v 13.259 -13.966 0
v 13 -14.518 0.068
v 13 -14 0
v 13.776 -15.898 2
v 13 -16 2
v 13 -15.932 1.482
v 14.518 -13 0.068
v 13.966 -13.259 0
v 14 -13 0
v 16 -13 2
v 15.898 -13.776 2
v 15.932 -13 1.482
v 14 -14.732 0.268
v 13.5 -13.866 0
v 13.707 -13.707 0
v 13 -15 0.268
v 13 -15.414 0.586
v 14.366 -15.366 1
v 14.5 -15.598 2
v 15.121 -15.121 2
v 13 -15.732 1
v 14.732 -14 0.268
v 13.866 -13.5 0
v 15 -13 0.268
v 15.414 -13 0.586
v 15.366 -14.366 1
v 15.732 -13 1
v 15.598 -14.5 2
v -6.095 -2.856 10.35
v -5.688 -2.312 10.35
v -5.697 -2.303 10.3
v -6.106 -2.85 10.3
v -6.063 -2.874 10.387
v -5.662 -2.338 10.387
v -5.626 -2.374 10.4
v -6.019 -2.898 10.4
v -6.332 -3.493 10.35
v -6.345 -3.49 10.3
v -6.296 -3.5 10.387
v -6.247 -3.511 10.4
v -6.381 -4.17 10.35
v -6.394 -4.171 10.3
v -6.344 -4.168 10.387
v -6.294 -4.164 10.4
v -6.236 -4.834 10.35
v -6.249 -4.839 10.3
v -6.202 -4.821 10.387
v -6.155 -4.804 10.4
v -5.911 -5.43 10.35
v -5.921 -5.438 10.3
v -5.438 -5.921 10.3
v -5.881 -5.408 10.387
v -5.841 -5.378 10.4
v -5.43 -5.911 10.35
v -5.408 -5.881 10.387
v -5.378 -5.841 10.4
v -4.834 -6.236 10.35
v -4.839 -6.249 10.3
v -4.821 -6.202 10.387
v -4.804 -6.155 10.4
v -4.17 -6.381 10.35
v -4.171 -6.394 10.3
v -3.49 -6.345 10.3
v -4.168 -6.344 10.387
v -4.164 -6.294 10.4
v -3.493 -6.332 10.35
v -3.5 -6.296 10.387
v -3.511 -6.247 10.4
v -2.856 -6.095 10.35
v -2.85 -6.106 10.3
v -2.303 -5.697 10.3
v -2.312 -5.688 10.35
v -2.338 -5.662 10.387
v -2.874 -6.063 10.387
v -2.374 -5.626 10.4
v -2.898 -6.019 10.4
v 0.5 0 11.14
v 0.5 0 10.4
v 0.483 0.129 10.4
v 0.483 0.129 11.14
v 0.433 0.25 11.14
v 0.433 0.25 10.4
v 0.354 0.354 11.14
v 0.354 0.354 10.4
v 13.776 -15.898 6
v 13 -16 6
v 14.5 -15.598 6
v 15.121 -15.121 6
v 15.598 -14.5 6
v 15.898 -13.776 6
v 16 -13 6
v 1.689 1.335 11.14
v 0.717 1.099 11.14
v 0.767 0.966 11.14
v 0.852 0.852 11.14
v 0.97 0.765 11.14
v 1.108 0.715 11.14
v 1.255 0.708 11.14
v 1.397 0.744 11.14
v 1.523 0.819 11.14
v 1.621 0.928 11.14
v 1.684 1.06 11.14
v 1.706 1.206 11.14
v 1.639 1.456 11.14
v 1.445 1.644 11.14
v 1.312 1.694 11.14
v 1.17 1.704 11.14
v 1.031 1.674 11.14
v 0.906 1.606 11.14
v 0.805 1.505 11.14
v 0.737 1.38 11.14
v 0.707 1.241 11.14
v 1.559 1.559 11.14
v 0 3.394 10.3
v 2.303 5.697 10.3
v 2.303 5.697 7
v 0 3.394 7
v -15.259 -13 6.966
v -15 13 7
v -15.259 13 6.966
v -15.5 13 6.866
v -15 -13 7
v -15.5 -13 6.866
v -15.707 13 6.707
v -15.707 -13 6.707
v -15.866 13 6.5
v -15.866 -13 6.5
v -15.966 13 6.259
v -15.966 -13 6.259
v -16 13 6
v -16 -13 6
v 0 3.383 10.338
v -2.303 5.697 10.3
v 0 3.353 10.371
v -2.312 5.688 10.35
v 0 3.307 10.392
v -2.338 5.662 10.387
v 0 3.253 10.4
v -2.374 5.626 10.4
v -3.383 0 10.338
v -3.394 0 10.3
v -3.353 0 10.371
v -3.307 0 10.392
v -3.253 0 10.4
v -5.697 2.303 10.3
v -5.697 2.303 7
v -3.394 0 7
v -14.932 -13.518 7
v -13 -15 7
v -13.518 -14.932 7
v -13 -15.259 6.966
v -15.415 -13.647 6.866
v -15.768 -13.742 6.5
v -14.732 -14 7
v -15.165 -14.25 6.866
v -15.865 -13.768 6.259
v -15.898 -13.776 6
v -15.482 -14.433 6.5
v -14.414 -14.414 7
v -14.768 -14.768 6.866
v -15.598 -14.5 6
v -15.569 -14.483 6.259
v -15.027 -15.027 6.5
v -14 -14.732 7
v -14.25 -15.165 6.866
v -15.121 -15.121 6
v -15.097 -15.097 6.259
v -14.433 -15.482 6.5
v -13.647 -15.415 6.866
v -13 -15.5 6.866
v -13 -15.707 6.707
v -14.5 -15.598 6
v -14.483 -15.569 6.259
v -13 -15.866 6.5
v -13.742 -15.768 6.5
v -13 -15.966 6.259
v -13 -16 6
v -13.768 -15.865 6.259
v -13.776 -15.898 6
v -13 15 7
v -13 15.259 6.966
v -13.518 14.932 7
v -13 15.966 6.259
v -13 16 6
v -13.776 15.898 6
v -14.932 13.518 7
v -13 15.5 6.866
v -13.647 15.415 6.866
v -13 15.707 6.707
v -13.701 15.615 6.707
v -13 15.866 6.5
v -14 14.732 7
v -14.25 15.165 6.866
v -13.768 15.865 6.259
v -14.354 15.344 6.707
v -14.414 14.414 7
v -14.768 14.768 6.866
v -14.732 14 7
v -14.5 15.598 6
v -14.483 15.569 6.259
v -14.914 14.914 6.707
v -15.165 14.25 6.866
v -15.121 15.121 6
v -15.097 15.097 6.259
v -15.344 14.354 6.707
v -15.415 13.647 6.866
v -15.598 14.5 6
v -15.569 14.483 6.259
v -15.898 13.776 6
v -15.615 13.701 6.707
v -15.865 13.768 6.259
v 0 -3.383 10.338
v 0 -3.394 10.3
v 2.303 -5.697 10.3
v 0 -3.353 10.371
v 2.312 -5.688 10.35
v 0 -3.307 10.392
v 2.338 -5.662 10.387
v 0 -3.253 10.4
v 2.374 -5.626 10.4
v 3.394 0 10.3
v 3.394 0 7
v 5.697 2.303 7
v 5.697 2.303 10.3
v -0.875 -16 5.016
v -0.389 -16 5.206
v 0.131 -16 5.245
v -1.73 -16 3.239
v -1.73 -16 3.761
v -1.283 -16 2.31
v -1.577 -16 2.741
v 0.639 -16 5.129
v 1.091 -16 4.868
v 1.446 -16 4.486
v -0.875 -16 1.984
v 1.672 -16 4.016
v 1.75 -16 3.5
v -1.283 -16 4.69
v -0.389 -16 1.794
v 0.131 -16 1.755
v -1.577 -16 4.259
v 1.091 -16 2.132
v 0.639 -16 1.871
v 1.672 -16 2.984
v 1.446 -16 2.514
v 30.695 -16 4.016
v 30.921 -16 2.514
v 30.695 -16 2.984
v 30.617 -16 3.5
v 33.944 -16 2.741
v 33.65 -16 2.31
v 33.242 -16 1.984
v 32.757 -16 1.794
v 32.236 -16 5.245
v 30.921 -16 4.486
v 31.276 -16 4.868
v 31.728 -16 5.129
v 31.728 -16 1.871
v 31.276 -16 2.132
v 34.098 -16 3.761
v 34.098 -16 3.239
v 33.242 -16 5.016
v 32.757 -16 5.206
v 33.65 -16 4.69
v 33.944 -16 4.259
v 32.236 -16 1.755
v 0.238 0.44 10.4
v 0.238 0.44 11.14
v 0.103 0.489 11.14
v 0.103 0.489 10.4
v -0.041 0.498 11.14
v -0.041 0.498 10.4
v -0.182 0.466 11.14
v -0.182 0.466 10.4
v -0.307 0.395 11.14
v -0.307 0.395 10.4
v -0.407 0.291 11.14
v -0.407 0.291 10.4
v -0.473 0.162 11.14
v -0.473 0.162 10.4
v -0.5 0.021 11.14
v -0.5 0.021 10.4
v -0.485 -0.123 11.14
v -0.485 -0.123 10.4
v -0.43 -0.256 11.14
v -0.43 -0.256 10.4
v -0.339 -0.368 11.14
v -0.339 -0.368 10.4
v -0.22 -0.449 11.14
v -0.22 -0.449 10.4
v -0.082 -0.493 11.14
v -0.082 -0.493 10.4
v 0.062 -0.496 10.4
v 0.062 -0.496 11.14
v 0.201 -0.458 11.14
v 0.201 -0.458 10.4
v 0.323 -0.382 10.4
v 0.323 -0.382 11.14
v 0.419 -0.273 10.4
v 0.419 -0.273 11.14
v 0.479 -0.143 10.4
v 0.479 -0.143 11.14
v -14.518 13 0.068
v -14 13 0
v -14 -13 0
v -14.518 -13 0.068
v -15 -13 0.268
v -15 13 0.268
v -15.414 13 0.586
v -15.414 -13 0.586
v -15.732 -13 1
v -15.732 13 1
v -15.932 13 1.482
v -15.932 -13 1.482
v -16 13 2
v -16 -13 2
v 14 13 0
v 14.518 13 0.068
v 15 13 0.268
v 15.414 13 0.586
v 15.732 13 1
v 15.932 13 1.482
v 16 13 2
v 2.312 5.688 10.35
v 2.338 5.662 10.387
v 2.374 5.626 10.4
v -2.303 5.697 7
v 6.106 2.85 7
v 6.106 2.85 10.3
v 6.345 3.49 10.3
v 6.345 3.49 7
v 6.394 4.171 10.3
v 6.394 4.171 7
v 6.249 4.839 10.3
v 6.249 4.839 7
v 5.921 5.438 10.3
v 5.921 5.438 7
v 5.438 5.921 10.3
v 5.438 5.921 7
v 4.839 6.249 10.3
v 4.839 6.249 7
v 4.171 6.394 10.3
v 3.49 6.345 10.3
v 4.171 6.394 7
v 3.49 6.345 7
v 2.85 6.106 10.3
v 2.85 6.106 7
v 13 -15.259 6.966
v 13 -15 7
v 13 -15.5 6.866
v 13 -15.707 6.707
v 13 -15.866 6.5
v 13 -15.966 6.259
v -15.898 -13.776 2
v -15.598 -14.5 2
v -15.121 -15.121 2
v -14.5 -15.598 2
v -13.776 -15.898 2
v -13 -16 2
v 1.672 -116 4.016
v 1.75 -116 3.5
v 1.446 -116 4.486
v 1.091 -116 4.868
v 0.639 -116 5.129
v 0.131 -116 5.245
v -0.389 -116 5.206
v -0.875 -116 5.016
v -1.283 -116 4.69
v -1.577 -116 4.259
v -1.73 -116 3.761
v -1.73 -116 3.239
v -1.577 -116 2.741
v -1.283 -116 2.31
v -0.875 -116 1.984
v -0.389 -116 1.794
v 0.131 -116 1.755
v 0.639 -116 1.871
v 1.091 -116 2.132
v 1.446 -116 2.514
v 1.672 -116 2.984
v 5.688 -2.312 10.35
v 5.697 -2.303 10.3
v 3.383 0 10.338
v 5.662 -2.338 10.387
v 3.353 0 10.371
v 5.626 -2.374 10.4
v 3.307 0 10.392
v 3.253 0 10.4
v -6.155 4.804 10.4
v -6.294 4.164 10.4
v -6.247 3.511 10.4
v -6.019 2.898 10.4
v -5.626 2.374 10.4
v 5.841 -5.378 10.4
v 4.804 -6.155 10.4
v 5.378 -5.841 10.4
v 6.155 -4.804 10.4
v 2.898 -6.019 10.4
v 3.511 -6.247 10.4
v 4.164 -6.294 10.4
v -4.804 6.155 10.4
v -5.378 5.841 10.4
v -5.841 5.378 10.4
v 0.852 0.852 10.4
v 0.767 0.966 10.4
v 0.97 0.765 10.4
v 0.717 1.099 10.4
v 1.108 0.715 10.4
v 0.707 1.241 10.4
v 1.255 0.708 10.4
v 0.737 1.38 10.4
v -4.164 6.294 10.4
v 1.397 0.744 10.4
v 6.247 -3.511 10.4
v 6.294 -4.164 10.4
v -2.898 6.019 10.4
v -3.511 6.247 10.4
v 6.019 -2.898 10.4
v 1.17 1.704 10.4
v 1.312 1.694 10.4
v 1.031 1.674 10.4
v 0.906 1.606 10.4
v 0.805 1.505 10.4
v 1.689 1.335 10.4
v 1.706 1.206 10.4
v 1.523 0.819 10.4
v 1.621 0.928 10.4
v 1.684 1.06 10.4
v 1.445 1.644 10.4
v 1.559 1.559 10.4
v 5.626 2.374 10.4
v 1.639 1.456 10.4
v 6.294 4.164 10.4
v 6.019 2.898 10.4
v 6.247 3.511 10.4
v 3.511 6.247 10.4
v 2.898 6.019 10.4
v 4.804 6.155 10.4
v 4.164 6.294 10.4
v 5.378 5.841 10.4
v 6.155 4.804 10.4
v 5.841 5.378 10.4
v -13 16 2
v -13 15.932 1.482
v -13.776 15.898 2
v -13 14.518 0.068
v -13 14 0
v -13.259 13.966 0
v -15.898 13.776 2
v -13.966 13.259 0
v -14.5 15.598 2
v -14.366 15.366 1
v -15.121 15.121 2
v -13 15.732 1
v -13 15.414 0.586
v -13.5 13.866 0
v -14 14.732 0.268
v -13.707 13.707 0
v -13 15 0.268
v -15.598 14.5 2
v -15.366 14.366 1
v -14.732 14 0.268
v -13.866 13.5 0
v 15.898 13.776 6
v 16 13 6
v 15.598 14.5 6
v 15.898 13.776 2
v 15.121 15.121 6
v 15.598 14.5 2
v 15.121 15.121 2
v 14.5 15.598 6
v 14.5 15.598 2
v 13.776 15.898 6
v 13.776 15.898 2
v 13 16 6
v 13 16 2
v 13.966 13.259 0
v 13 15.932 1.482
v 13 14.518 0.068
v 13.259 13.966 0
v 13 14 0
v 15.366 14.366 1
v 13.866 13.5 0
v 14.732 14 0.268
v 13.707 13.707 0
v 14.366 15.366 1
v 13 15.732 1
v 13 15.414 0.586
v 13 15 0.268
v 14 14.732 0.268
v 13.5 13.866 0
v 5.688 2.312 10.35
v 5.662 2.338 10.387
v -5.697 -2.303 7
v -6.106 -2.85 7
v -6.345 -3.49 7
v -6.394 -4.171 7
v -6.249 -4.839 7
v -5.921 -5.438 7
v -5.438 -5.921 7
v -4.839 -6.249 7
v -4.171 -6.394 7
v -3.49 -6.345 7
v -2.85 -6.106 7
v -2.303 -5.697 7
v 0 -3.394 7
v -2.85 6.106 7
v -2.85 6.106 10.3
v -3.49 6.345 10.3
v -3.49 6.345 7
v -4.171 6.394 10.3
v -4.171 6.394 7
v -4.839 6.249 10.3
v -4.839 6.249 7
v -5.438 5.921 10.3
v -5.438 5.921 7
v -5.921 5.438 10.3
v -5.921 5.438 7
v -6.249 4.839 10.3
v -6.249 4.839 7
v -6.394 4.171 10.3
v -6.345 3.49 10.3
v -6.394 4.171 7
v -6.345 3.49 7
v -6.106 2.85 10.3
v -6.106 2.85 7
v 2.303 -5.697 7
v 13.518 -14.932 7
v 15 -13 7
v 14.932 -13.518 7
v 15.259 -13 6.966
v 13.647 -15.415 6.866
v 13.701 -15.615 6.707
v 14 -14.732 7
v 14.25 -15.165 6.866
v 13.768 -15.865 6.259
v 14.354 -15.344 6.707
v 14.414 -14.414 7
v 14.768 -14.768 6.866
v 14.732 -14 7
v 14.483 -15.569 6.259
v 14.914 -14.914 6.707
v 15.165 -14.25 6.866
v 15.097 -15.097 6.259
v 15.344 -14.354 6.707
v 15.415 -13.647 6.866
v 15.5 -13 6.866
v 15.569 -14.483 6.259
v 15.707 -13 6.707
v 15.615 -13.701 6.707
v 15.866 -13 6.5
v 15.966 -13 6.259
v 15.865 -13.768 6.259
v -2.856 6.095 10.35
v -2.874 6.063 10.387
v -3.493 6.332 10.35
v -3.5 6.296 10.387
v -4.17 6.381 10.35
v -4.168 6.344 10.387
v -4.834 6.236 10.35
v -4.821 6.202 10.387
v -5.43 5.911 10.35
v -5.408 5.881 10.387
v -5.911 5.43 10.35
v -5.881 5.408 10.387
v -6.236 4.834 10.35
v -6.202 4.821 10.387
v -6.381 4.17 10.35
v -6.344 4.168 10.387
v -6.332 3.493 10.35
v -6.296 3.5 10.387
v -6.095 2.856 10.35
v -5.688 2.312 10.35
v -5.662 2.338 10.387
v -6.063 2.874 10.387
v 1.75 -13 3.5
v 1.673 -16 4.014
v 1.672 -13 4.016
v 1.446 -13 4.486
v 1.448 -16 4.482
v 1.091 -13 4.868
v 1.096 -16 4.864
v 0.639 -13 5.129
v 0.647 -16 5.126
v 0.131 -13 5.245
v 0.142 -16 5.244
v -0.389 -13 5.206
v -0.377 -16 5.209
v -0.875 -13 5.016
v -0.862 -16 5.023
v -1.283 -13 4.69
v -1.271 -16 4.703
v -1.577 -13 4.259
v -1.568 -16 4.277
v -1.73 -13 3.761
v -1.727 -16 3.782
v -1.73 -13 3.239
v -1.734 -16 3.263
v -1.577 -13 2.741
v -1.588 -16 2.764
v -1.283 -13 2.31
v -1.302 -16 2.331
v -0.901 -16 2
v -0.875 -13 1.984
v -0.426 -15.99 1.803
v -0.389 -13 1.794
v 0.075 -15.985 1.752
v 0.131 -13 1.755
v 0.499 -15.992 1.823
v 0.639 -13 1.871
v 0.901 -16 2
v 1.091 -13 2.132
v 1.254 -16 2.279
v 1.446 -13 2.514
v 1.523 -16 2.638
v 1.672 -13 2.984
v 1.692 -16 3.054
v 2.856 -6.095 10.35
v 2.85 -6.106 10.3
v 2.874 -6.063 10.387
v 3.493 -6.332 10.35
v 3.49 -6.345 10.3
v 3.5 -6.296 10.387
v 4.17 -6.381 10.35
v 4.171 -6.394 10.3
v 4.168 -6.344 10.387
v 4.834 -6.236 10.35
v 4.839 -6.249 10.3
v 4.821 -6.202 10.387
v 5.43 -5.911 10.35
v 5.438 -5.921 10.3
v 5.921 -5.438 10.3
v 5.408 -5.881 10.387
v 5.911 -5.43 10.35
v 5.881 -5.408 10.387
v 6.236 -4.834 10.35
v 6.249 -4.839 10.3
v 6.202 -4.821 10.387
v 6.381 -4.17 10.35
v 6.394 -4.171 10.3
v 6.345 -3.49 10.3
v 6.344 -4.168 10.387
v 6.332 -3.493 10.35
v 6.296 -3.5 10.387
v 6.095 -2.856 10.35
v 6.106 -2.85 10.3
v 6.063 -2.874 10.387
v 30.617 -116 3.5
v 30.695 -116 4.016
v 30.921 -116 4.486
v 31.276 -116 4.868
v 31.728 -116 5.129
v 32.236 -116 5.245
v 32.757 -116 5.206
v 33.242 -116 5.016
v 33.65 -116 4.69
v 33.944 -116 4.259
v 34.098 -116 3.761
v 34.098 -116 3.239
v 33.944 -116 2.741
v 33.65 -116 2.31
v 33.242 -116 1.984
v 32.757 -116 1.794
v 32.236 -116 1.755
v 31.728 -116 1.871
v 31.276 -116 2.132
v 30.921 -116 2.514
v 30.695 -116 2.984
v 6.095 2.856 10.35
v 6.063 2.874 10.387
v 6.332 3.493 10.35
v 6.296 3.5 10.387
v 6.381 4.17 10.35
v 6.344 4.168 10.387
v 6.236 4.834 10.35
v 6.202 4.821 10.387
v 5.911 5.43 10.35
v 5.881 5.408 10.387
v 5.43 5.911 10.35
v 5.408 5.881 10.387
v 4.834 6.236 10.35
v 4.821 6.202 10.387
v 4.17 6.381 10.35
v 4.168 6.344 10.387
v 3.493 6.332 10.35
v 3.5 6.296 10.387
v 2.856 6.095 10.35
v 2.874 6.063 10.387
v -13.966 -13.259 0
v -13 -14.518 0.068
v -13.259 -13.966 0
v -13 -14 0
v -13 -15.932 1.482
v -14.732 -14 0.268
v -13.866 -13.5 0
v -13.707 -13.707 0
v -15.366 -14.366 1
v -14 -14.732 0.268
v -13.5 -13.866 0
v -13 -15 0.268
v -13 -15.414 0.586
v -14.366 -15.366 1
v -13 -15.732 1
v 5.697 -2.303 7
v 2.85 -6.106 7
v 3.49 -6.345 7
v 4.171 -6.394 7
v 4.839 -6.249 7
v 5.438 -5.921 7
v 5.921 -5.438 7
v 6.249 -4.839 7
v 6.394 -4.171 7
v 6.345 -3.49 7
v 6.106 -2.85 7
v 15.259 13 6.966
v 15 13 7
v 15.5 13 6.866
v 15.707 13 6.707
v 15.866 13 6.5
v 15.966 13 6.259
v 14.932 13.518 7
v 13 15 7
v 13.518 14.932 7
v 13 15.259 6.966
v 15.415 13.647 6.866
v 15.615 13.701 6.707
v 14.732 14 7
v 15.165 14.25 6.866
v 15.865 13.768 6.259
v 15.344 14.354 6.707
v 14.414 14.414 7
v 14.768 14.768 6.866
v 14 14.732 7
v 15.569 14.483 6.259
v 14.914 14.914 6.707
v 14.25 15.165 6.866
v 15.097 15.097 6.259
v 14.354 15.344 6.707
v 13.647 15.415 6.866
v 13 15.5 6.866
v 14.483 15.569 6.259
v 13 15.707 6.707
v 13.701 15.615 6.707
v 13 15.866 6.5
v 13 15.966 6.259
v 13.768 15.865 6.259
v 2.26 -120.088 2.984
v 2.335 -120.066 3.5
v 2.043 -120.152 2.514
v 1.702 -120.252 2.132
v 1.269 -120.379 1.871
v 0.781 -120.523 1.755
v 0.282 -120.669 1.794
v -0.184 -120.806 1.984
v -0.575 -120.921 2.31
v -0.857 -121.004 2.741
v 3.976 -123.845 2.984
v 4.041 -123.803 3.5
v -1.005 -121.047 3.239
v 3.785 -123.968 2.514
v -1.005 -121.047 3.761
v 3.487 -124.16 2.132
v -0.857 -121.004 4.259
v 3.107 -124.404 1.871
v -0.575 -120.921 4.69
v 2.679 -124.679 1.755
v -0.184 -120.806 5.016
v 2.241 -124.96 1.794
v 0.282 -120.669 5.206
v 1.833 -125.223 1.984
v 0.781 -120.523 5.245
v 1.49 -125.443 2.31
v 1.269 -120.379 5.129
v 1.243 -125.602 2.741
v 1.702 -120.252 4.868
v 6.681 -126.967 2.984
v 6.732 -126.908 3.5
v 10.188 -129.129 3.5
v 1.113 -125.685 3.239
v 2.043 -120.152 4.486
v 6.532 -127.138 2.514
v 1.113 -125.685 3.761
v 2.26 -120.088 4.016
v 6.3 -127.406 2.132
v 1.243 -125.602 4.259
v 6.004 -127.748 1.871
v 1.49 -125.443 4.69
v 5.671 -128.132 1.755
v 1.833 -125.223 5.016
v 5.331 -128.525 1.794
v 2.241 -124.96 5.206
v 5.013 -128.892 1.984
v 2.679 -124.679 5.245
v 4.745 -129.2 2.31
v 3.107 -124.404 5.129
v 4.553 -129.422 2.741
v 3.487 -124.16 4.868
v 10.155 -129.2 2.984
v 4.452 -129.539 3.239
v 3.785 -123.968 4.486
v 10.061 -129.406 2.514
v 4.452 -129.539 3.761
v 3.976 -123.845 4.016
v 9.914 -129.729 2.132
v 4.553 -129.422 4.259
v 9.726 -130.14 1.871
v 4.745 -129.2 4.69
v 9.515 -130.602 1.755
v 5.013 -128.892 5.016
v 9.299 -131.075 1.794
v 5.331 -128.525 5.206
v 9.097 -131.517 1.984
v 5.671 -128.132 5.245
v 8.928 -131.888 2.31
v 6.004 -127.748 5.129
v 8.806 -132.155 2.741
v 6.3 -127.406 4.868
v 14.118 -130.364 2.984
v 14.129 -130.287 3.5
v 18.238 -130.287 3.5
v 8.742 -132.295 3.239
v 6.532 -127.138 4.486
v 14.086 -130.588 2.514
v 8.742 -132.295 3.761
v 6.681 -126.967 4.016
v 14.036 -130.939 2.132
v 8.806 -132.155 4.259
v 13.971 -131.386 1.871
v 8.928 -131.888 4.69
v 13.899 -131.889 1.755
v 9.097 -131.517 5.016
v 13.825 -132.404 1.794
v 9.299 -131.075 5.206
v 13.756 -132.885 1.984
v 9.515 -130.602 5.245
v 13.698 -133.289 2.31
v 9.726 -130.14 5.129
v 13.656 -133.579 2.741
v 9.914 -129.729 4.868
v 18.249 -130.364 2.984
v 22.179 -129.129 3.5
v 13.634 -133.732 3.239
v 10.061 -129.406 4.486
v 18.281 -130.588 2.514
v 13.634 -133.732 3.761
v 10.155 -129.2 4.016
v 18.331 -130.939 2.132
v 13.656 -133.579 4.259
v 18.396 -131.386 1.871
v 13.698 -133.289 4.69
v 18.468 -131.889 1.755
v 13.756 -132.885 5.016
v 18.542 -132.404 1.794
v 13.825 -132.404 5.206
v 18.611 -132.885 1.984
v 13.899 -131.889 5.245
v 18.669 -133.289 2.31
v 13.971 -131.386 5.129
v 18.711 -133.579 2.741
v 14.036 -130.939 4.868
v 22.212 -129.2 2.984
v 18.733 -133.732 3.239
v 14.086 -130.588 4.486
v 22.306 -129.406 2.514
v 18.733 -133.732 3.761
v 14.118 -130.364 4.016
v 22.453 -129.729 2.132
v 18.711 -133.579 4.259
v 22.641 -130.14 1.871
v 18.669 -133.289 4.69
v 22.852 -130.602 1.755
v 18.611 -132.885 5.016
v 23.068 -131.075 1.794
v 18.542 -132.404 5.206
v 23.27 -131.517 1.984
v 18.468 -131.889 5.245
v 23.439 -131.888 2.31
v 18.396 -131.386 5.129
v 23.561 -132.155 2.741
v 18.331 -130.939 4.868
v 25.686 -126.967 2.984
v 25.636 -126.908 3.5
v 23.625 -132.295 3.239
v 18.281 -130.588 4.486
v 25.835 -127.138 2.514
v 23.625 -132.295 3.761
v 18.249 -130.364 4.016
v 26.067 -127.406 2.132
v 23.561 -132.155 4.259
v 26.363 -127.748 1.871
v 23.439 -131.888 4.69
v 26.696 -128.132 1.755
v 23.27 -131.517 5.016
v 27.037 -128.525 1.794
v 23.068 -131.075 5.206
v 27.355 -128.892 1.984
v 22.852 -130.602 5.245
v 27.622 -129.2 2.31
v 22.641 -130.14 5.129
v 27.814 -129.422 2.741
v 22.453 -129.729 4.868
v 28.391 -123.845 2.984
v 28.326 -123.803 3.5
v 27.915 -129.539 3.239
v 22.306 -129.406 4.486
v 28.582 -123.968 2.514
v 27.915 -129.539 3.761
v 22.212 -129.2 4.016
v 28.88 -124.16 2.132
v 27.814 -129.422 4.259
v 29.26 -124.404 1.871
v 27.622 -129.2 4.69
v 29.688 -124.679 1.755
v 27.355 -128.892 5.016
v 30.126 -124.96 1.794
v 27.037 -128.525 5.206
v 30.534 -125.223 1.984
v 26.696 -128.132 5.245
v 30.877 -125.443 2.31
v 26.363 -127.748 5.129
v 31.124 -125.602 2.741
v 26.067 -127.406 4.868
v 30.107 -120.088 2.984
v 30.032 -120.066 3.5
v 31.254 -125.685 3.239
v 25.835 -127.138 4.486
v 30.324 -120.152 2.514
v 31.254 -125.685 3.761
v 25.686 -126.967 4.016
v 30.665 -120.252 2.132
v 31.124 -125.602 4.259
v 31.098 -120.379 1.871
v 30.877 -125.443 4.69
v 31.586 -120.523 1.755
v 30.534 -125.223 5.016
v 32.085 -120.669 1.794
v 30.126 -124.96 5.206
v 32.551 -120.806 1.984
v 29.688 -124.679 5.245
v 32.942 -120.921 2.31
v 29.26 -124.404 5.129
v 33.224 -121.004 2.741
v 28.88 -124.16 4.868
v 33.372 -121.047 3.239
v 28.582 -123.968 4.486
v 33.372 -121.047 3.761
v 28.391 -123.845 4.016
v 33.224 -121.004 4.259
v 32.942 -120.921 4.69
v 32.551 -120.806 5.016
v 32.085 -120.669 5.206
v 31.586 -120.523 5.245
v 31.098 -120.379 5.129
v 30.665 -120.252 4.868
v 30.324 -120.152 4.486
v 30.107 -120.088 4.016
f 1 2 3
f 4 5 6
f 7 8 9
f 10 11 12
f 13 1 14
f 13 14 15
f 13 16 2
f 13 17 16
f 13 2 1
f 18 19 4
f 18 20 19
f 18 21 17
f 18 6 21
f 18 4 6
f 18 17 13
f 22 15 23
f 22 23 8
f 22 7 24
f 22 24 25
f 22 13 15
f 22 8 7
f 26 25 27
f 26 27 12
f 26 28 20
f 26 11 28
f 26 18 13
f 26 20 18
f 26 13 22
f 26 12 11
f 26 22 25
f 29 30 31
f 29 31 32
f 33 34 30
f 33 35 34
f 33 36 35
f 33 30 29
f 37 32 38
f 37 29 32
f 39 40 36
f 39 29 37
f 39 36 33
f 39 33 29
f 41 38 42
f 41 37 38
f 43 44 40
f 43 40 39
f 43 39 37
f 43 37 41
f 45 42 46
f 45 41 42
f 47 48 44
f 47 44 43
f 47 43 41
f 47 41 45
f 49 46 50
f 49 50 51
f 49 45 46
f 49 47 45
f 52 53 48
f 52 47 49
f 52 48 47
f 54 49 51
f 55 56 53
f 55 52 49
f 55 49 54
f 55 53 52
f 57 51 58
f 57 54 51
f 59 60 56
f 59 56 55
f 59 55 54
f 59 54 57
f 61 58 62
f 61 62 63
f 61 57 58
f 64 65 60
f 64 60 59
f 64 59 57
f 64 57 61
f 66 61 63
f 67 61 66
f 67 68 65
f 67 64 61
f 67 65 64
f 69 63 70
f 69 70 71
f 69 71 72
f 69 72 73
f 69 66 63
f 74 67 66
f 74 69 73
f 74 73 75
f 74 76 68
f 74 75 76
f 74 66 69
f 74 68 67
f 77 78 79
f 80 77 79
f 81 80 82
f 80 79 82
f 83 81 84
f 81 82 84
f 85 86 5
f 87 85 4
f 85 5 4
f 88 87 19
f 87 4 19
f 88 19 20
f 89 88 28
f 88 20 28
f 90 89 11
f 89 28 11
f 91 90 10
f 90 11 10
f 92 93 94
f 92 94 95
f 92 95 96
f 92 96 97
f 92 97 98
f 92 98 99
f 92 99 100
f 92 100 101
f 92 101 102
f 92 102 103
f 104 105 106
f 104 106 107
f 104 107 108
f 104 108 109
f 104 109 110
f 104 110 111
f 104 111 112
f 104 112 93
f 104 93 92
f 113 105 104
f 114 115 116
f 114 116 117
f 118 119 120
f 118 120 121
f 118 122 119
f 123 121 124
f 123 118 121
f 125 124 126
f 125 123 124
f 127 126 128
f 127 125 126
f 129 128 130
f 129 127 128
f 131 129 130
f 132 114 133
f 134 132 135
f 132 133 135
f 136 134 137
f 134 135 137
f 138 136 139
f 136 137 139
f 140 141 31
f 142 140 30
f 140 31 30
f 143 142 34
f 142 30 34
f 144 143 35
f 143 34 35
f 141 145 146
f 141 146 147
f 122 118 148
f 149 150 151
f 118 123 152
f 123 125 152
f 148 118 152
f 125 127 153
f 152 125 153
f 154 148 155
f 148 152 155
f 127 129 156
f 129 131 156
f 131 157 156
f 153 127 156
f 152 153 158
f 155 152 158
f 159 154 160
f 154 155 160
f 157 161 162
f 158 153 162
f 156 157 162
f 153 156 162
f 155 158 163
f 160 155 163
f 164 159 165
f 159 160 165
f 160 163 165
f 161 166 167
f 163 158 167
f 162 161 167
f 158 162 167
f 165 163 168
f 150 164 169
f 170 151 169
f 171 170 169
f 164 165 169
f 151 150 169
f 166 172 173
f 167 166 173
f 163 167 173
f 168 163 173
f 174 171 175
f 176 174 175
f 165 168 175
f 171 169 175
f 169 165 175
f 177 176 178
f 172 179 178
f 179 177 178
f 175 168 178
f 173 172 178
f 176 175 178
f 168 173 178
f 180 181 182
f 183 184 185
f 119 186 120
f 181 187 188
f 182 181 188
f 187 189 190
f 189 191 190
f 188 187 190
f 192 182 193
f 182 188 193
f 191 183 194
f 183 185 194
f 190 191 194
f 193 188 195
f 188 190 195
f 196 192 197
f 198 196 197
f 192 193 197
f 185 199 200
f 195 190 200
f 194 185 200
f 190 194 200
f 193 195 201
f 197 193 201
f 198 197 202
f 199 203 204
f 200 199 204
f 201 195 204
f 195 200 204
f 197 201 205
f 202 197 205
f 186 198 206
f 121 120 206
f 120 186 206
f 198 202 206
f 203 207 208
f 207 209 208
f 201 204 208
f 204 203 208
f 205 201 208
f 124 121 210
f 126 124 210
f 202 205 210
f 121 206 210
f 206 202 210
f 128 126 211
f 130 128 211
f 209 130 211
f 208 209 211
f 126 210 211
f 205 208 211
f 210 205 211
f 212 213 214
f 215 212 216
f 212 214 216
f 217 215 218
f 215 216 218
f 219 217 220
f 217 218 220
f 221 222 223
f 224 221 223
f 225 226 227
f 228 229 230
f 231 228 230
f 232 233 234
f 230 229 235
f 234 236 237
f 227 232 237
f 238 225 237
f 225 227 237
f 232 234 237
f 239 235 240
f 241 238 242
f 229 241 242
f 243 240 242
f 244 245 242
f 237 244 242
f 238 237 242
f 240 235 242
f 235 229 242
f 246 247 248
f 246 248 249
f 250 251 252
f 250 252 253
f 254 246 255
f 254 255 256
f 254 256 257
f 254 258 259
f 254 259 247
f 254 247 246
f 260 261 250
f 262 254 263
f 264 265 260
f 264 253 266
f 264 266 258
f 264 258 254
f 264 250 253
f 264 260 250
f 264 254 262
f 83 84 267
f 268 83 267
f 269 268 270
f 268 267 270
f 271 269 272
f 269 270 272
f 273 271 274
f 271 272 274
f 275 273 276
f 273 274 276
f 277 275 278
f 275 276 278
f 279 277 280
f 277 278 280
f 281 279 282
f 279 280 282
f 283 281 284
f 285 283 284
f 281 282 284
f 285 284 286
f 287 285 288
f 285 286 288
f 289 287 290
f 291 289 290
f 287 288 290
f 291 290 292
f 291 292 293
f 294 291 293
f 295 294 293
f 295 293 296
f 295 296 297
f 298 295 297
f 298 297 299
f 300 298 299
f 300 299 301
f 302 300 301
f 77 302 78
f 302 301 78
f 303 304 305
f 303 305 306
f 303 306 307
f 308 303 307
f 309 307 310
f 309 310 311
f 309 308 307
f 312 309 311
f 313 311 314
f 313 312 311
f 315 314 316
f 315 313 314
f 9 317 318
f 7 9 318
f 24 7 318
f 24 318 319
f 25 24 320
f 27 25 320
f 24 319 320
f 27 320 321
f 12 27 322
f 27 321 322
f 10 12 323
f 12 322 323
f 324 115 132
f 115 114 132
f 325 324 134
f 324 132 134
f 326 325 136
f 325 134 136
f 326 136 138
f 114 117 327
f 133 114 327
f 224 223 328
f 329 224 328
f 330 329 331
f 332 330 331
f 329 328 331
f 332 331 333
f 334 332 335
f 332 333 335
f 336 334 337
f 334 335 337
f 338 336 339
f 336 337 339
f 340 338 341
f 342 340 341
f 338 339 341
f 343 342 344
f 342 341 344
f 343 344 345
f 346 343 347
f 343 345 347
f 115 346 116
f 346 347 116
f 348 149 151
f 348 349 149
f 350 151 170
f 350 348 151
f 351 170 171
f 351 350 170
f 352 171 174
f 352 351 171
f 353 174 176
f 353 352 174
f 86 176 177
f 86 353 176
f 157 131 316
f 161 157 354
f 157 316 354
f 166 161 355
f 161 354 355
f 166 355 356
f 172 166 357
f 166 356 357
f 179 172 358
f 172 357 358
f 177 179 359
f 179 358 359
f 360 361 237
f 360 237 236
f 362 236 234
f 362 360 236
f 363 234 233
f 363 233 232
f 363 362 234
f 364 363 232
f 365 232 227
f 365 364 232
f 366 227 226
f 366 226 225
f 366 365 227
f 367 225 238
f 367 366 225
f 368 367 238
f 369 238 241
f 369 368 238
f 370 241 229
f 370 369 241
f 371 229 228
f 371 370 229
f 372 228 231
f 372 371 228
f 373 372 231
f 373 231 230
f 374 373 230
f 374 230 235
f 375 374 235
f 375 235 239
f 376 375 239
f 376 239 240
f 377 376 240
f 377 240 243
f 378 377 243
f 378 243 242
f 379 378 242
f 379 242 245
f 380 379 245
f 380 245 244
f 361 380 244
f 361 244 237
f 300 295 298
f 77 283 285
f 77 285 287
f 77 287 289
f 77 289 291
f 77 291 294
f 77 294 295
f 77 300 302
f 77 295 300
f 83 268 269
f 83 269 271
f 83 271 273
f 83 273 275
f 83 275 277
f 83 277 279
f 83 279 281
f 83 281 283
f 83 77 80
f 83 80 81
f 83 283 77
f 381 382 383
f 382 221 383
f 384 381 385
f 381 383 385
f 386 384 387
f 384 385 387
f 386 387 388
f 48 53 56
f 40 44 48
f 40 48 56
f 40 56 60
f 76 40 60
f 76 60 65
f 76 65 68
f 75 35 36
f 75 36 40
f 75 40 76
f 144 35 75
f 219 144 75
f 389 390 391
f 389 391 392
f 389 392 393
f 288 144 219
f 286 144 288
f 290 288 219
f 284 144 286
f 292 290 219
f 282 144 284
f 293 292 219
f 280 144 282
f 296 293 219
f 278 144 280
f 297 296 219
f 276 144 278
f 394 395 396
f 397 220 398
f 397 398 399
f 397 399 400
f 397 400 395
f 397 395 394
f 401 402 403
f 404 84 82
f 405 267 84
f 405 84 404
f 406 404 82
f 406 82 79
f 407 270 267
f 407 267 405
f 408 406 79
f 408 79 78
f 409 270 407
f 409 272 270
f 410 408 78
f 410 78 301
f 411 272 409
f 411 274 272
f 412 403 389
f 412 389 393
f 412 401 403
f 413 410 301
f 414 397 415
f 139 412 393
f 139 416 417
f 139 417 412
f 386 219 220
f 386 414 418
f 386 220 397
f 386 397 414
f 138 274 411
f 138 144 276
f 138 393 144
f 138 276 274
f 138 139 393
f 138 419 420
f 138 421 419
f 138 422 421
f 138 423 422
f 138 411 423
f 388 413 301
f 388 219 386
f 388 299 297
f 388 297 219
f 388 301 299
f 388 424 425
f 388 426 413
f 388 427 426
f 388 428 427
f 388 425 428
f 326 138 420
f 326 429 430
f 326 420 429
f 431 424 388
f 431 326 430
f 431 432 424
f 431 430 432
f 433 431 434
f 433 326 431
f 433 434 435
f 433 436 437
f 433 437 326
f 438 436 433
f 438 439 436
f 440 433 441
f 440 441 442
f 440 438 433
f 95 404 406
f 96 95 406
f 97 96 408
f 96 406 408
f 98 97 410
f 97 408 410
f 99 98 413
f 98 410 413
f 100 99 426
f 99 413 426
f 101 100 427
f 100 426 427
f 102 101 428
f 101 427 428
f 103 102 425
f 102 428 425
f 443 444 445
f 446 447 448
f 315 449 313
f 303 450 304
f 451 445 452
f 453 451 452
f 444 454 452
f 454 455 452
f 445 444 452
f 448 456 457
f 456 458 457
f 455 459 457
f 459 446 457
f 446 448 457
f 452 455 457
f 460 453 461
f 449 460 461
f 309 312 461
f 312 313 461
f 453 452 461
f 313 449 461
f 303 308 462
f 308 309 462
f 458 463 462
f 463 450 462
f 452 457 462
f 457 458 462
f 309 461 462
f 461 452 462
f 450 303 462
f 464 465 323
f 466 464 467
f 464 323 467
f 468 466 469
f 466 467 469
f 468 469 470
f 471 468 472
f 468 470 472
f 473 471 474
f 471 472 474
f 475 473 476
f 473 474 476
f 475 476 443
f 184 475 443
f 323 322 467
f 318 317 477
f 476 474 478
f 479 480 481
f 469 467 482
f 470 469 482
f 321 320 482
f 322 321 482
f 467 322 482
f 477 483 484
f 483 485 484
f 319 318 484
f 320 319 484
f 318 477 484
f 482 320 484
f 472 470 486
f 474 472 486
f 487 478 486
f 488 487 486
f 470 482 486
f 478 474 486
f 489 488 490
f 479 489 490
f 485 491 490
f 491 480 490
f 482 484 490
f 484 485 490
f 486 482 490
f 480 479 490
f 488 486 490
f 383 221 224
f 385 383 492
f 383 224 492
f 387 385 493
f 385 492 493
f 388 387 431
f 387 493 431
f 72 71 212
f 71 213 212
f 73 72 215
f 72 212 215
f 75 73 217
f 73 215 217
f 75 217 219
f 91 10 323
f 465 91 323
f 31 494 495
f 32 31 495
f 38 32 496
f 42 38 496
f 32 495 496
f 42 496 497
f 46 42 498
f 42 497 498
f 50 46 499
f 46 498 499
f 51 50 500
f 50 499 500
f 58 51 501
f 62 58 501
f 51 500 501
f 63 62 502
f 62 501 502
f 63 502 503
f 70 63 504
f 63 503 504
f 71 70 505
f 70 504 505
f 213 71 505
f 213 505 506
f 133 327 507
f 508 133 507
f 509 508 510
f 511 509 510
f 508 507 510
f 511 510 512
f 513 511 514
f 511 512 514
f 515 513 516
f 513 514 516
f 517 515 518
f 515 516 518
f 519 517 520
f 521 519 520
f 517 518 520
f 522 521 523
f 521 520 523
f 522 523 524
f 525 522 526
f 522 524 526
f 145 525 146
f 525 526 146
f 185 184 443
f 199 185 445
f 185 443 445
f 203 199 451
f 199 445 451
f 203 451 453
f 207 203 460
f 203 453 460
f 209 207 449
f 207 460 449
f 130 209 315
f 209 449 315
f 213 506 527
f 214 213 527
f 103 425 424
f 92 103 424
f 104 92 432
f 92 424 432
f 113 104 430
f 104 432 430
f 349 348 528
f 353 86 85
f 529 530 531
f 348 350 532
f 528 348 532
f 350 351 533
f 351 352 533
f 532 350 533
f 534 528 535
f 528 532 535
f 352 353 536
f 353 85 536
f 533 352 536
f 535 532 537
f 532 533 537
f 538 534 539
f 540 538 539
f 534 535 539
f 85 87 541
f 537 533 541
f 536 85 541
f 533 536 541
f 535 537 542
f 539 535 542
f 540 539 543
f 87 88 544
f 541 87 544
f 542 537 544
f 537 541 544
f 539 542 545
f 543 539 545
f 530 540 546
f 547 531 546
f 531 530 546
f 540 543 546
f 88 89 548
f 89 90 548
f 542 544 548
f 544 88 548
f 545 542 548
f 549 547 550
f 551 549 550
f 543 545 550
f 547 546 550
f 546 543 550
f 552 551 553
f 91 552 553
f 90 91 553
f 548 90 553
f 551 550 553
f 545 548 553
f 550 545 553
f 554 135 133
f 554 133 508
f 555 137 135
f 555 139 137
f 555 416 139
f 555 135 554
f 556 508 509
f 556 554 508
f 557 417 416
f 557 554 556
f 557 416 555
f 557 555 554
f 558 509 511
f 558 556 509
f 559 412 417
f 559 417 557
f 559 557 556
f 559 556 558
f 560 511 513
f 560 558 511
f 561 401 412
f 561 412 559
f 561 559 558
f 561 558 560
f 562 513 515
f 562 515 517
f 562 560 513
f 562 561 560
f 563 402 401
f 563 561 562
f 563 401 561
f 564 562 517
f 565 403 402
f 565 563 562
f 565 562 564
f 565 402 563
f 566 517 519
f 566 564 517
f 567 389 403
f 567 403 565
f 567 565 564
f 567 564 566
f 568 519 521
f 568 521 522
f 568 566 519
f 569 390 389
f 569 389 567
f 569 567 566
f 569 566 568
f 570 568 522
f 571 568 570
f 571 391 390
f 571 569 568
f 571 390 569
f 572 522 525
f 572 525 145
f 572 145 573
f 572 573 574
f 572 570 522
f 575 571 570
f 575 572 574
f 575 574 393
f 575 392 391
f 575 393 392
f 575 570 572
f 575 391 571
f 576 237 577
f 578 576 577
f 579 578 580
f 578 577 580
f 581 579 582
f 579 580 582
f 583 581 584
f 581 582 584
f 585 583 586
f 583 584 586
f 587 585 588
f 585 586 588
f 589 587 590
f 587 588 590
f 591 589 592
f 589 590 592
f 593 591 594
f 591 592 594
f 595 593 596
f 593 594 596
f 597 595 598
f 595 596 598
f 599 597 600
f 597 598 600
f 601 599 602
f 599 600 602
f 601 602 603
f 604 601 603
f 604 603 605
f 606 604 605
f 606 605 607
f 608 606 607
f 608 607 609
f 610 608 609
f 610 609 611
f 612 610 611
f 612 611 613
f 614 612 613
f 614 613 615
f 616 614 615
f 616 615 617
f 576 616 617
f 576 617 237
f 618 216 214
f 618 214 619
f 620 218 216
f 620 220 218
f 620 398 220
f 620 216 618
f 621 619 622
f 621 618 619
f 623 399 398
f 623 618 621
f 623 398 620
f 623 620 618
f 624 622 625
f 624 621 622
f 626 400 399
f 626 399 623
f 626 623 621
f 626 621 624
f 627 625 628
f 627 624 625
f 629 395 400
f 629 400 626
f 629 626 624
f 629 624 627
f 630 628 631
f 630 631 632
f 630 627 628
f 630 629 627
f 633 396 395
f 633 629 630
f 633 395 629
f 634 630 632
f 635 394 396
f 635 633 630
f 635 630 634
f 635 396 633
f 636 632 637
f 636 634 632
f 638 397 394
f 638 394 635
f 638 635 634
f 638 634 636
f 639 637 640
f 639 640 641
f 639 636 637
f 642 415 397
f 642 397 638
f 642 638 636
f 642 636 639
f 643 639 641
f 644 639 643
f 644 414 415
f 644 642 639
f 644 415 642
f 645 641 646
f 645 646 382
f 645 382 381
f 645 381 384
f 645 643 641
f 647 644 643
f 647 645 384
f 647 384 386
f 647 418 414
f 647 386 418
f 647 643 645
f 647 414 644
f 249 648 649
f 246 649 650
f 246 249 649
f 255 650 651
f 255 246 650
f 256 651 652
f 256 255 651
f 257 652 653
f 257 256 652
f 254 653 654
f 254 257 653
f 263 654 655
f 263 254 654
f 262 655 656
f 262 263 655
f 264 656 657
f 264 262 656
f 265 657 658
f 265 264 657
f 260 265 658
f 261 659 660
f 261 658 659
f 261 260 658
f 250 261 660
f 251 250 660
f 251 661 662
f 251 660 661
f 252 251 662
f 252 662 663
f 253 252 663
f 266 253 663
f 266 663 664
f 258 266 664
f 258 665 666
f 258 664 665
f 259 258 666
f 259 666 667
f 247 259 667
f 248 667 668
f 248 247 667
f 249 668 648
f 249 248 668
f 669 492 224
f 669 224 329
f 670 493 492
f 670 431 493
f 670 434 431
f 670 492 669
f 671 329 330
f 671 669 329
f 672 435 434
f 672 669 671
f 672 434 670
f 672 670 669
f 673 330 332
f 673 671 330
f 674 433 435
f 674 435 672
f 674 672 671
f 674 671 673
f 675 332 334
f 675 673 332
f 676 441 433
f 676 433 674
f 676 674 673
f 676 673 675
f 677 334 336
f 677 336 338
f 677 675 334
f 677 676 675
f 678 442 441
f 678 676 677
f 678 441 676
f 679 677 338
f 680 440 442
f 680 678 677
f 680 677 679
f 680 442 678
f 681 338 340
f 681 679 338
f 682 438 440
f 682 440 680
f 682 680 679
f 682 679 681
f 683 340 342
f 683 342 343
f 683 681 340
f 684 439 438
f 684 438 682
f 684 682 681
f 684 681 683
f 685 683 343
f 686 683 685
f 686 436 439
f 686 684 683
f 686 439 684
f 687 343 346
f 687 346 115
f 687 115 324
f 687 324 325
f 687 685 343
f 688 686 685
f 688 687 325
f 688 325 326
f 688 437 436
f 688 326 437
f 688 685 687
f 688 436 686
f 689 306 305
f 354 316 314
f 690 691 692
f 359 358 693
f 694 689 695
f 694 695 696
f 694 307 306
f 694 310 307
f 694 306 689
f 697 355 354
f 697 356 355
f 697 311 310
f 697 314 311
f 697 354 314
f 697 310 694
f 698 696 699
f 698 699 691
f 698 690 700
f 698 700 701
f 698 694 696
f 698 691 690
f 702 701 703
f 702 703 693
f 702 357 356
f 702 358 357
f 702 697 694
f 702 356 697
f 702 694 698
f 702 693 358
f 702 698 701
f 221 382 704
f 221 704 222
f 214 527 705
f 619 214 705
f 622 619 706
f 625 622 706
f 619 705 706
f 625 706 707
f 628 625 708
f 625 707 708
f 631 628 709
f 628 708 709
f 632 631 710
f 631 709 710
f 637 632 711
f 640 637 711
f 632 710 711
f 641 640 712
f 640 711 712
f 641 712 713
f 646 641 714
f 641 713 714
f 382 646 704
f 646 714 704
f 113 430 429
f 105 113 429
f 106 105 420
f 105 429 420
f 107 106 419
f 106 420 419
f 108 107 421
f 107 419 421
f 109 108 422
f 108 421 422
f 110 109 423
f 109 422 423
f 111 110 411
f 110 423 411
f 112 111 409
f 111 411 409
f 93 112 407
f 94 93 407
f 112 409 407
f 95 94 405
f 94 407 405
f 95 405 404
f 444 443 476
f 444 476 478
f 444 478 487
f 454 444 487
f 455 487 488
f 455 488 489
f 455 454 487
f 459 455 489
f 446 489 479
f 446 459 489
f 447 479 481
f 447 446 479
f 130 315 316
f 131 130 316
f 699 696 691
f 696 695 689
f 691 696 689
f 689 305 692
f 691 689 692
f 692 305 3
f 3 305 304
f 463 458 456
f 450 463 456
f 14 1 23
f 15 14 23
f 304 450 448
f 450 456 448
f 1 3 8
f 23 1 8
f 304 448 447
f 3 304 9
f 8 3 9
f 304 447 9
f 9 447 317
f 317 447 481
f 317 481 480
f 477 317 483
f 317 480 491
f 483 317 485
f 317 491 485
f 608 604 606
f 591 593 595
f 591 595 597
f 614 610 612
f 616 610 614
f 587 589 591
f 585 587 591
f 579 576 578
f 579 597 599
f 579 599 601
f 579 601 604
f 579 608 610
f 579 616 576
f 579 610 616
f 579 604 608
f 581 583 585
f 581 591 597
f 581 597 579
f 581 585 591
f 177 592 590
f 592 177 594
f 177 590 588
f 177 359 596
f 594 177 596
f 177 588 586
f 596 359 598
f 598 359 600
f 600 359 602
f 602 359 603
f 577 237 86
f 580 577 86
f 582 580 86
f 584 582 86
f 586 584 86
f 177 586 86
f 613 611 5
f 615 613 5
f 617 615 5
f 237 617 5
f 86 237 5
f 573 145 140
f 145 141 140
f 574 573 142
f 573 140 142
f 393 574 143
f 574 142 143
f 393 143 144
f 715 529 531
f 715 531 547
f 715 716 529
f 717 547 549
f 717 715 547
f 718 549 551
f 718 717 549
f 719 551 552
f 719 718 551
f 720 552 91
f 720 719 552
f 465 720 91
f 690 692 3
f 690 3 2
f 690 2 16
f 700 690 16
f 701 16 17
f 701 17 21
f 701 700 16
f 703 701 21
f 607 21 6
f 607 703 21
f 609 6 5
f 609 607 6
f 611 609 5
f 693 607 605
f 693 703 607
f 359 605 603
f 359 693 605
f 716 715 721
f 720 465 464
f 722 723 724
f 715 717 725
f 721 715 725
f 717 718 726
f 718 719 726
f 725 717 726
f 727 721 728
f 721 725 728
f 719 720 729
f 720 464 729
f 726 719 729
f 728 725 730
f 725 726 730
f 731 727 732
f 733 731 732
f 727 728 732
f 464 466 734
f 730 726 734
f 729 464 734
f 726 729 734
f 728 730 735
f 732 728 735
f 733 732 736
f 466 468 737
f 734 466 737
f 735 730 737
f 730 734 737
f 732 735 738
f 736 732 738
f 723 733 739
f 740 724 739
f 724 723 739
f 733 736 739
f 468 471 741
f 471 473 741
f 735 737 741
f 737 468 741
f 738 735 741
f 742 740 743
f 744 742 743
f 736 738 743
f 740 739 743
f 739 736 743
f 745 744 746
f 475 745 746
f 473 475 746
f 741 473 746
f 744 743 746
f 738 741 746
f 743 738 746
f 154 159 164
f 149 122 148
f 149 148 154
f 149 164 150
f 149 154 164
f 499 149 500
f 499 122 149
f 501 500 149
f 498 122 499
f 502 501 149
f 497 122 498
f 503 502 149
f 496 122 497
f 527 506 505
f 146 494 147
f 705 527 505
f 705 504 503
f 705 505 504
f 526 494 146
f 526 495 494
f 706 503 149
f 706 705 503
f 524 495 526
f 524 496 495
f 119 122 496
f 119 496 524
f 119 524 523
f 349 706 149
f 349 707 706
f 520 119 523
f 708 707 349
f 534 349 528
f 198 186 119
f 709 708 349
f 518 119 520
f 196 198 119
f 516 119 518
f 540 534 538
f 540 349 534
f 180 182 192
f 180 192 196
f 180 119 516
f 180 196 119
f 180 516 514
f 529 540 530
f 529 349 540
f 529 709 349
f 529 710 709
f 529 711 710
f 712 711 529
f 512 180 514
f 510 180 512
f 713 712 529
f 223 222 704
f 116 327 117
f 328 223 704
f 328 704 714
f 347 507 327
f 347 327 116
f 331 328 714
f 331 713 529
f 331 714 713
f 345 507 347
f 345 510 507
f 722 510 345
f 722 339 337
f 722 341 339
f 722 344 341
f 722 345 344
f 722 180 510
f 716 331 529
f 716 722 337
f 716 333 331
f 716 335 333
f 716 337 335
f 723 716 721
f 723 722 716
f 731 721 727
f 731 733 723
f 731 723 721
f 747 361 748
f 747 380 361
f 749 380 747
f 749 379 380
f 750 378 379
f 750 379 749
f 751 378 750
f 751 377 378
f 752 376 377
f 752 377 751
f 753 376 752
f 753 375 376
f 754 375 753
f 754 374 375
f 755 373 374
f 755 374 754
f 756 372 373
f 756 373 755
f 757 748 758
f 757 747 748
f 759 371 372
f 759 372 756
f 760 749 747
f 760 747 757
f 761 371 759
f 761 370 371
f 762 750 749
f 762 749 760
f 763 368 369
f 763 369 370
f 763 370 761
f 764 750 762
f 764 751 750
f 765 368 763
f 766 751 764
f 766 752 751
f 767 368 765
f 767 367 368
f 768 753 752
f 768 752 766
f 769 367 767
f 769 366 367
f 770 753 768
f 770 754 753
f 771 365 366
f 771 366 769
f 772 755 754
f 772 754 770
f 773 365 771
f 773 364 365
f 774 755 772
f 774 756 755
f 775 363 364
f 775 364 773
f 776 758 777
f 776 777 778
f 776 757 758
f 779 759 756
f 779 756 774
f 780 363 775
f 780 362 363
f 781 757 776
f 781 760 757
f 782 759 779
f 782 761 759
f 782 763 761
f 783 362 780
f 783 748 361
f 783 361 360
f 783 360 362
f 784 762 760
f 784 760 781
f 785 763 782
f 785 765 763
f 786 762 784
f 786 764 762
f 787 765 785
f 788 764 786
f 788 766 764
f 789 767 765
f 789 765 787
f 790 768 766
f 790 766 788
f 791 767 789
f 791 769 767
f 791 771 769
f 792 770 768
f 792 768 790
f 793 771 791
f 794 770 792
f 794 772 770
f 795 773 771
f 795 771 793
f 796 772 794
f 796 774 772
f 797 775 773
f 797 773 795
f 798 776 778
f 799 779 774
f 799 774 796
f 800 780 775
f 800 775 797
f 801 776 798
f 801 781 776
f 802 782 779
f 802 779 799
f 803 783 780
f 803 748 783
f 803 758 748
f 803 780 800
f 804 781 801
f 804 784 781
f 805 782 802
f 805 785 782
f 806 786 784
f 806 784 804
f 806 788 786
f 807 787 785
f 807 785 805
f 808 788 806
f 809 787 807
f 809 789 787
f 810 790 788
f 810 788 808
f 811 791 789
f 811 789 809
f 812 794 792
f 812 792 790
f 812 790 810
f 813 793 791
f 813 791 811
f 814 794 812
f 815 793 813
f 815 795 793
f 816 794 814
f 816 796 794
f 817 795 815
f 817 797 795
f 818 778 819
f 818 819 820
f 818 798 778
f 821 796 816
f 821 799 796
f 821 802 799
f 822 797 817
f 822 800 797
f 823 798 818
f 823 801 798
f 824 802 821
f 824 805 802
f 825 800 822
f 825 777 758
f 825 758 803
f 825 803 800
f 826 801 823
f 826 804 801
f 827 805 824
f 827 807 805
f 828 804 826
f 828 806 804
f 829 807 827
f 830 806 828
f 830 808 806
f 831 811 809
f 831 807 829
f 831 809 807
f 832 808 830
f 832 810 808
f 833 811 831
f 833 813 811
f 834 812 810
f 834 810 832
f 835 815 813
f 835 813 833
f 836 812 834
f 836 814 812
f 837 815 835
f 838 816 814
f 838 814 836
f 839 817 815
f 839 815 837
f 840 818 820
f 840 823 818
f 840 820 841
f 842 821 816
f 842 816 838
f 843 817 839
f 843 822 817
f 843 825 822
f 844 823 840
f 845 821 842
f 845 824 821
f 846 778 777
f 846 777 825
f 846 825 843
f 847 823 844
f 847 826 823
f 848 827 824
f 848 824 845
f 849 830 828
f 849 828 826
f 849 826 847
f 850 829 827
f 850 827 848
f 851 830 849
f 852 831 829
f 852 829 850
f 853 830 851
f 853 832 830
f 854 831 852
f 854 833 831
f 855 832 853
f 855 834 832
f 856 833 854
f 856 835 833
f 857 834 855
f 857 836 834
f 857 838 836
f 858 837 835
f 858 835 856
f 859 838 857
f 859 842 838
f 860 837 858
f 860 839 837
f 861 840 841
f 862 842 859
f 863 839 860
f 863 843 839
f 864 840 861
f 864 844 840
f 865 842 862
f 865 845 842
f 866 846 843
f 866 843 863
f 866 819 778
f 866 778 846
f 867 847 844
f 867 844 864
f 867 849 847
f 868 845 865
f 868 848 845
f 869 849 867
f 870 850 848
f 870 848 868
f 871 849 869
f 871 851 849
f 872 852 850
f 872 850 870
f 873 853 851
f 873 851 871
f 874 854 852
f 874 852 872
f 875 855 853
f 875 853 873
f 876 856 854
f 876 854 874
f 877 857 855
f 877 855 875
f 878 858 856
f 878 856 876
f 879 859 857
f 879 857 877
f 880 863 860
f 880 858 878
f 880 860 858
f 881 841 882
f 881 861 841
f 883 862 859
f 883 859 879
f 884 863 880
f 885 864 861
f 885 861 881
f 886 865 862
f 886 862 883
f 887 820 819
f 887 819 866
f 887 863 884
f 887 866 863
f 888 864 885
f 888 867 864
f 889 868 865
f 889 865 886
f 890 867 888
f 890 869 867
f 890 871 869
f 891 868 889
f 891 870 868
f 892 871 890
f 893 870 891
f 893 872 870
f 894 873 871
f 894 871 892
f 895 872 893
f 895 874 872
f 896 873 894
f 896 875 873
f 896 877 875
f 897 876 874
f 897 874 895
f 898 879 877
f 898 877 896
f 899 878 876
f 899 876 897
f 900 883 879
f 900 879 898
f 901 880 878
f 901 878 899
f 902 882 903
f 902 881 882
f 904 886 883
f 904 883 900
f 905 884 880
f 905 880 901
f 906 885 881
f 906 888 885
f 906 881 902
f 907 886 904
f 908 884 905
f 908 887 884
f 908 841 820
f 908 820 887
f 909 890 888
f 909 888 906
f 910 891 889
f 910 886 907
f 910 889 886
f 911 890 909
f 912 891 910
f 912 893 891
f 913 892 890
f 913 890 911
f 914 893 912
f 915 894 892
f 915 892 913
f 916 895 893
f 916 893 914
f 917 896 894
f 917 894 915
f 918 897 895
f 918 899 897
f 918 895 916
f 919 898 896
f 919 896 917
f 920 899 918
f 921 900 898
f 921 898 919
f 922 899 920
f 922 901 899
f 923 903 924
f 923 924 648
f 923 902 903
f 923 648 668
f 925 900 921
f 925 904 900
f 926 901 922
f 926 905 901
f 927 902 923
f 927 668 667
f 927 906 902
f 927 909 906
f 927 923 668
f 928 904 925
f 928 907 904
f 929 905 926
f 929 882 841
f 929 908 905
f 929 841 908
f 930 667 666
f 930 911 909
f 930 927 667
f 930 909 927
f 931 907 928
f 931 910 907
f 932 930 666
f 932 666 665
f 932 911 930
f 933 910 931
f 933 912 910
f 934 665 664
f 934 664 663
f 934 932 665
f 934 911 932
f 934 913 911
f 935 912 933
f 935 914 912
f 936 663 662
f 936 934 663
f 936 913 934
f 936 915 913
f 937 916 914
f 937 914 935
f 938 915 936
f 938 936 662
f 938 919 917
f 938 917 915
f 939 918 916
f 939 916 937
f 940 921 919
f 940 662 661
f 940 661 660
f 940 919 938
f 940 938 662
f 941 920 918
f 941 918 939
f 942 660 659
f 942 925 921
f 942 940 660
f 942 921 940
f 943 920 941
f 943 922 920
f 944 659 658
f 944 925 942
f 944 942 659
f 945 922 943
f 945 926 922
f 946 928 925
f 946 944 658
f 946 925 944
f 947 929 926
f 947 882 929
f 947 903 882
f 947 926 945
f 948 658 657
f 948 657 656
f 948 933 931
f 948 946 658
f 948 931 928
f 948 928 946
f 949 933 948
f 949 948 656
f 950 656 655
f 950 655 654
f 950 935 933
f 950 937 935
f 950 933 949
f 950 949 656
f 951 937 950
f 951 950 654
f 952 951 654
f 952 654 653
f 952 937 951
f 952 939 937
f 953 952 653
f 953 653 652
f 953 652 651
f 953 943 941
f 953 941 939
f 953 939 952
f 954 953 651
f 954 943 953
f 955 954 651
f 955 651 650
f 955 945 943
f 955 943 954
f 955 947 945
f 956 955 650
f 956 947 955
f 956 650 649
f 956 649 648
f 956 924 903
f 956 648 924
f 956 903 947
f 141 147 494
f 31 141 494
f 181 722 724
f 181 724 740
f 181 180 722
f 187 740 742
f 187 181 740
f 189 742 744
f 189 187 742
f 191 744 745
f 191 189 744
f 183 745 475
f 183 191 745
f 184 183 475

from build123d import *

# Parameters (mm, degrees)
F1_DEPTH     = 7
F3_DEPTH     = 3.4
F5_DEPTH     = 0.74
F6_R         = 1.75
F7_DEPTH     = 3
F8_T1_DEPTH  = 26
F8_T3_DEPTH  = 26
F8_T6_ANGLE  = 90
F8_T8_ANGLE  = 90
F8_T10_ANGLE = 90
F8_T12_ANGLE = 90
F9_R         = 1
F10_R        = 0.1


# Not quite as in the source:
# - a fillet or chamfer that OpenCascade refuses, or shapes differently, is made with other operations: its cross-section is extruded or revolved along the edge and cut away or added


with BuildPart() as f1:
    # F0 (on Top) → F1 (new body)
    with BuildSketch(Plane.XY):
        with BuildLine():
            Line((13, 16), (-13, 16))
            ThreePointArc((-13, 16), (-15.1213203436, 15.1213203436), (-16, 13))
            Line((-16, 13), (-16, -13))
            ThreePointArc((-16, -13), (-15.1213203436, -15.1213203436), (-13, -16))
            Line((-13, -16), (13, -16))
            ThreePointArc((13, -16), (15.1213203436, -15.1213203436), (16, -13))
            Line((16, -13), (16, 13))
            ThreePointArc((16, 13), (15.1213203436, 15.1213203436), (13, 16))
        make_face()
    extrude(amount=F1_DEPTH)

    # F2 (on face) → F3 (join)
    with BuildSketch(Plane.XY.offset(7)):
        with BuildLine():
            Line((0, 3.3941125497), (-2.3029437252, 5.6970562748))
            ThreePointArc((-2.3029437252, 5.6970562748), (-5.6970562748, 5.6970562748), (-5.6970562748, 2.3029437252))
            Line((-5.6970562748, 2.3029437252), (-3.3941125497, 0))
            Line((-3.3941125497, 0), (-5.6970562748, -2.3029437252))
            ThreePointArc((-5.6970562748, -2.3029437252), (-5.6970562748, -5.6970562748), (-2.3029437252, -5.6970562748))
            Line((-2.3029437252, -5.6970562748), (0, -3.3941125497))
            Line((0, -3.3941125497), (2.3029437252, -5.6970562748))
            ThreePointArc((2.3029437252, -5.6970562748), (5.6970562748, -5.6970562748), (5.6970562748, -2.3029437252))
            Line((5.6970562748, -2.3029437252), (3.3941125497, 0))
            Line((3.3941125497, 0), (5.6970562748, 2.3029437252))
            ThreePointArc((5.6970562748, 2.3029437252), (5.6970562748, 5.6970562748), (2.3029437252, 5.6970562748))
            Line((2.3029437252, 5.6970562748), (0, 3.3941125497))
        make_face()
    extrude(amount=F3_DEPTH)

    # F4 (on face) → F5 (join)
    with BuildSketch(Plane.XY.offset(10.4)):
        with BuildLine():
            ThreePointArc((0.3535533906, 0.3535533906), (-0.4619397663, -0.1913417162), (0.5, 0))
            ThreePointArc((0.5, 0), (0.4619397663, 0.1913417162), (0.3535533906, 0.3535533906))
        make_face()
        with BuildLine():
            ThreePointArc((1.5591911551, 1.5591911551), (0.8520843739, 1.5591911551), (0.8520843739, 0.8520843739))
            Line((0.8520843739, 0.8520843739), (1.5591911551, 1.5591911551))
        make_face()
        with BuildLine():
            Line((1.5591911551, 1.5591911551), (0.8520843739, 0.8520843739))
            ThreePointArc((0.8520843739, 0.8520843739), (1.3969794806, 0.7436979982), (1.7056377645, 1.2056377645))
            ThreePointArc((1.7056377645, 1.2056377645), (1.6675775307, 1.3969794806), (1.5591911551, 1.5591911551))
        make_face()
    extrude(amount=F5_DEPTH)

    # F6 (on face) → F7 (cut)
    with BuildSketch(Plane.XZ.offset(16)):
        with Locations((0, 3.5)):
            Circle(F6_R)
    extrude(amount=-F7_DEPTH, mode=Mode.SUBTRACT)

    # F8: fillet of radius 2 on 8 edges, made by hand

    # F8_s2 → F8_t1 (cut)
    with BuildSketch(Plane.YZ.offset(-13)):
        with BuildLine():
            ThreePointArc((-14, 0), (-15.4142135624, 0.5857864376), (-16, 2))
            Line((-16, 2), (-16, 0))
            Line((-16, 0), (-14, 0))
        make_face()
        with BuildLine():
            ThreePointArc((16, 2), (15.4142135624, 0.5857864376), (14, 0))
            Line((14, 0), (16, 0))
            Line((16, 0), (16, 2))
        make_face()
    extrude(amount=F8_T1_DEPTH, mode=Mode.SUBTRACT)

    # F8_s4 → F8_t3 (cut)
    with BuildSketch(Plane.XZ.offset(-13)):
        with BuildLine():
            ThreePointArc((-14, 0), (-15.4142135624, 0.5857864376), (-16, 2))
            Line((-16, 2), (-16, 0))
            Line((-16, 0), (-14, 0))
        make_face()
        with BuildLine():
            ThreePointArc((14, 0), (15.4142135624, 0.5857864376), (16, 2))
            Line((16, 2), (16, 0))
            Line((16, 0), (14, 0))
        make_face()
    extrude(amount=F8_T3_DEPTH, mode=Mode.SUBTRACT)

    # F8_s5 → F8_t6 (revolve, cut)
    with BuildSketch(Plane.XZ.offset(-13)):
        with BuildLine():
            ThreePointArc((16, 2), (15.4142135624, 0.5857864376), (14, 0))
            Line((14, 0), (16, 0))
            Line((16, 0), (16, 2))
        make_face()
    revolve(axis=Axis((13, 13, 0), (0, 0, 1)), revolution_arc=F8_T6_ANGLE, mode=Mode.SUBTRACT)

    # F8_s7 → F8_t8 (revolve, cut)
    with BuildSketch(Plane.YZ.offset(-13)):
        with BuildLine():
            ThreePointArc((16, 2), (15.4142135624, 0.5857864376), (14, 0))
            Line((14, 0), (16, 0))
            Line((16, 0), (16, 2))
        make_face()
    revolve(axis=Axis((-13, 13, 0), (0, 0, 1)), revolution_arc=F8_T8_ANGLE, mode=Mode.SUBTRACT)

    # F8_s9 → F8_t10 (revolve, cut)
    with BuildSketch(Plane.XZ.offset(13)):
        with BuildLine():
            ThreePointArc((-14, 0), (-15.4142135624, 0.5857864376), (-16, 2))
            Line((-16, 2), (-16, 0))
            Line((-16, 0), (-14, 0))
        make_face()
    revolve(axis=Axis((-13, -13, 0), (0, 0, 1)), revolution_arc=F8_T10_ANGLE, mode=Mode.SUBTRACT)

    # F8_s11 → F8_t12 (revolve, cut)
    with BuildSketch(Plane.YZ.offset(13)):
        with BuildLine():
            ThreePointArc((-14, 0), (-15.4142135624, 0.5857864376), (-16, 2))
            Line((-16, 2), (-16, 0))
            Line((-16, 0), (-14, 0))
        make_face()
    revolve(axis=Axis((13, -13, 0), (0, 0, 1)), revolution_arc=F8_T12_ANGLE, mode=Mode.SUBTRACT)

    # F9
    f9_edges = [f1.edges().sort_by_distance(p)[0] for p in [
        (0, -16, 7),
        (-15.12132, 15.12132, 7),
        (-16, 0, 7),
        (0, 16, 7),
        (15.12132, 15.12132, 7),
        (16, 0, 7),
        (15.12132, -15.12132, 7),
        (-15.12132, -15.12132, 7),
    ]]
    fillet(f9_edges, radius=F9_R)

    # F10
    f10_edges = [f1.edges().sort_by_distance(p)[0] for p in [
        (-1.151472, -4.545584, 10.4),
        (1.151472, -4.545584, 10.4),
        (4.545584, 1.151472, 10.4),
        (-1.151472, 4.545584, 10.4),
        (5.697056, 5.697056, 10.4),
        (1.151472, 4.545584, 10.4),
        (-5.697056, 5.697056, 10.4),
        (-4.545584, 1.151472, 10.4),
        (-4.545584, -1.151472, 10.4),
        (-5.697056, -5.697056, 10.4),
        (5.697056, -5.697056, 10.4),
        (4.545584, -1.151472, 10.4),
    ]]
    fillet(f10_edges, radius=F10_R)


with BuildPart() as f12:
    # F12: sweep along a path in F11
    with BuildLine(Plane.XY) as f12_path:
        Line((-1.316445414, -16), (-1.316445414, -116))
        ThreePointArc((-1.316445414, -116), (16.183554586, -133.5), (33.683554586, -116))
        Line((33.683554586, -116), (33.683554586, -16))
    # F6 (on face) → F12 (sweep)
    with BuildSketch(Plane.XZ.offset(16)):
        with Locations((0, 3.5)):
            Circle(F6_R)
    sweep(path=f12_path.line)


solid = Compound([f1.part, f12.part])
